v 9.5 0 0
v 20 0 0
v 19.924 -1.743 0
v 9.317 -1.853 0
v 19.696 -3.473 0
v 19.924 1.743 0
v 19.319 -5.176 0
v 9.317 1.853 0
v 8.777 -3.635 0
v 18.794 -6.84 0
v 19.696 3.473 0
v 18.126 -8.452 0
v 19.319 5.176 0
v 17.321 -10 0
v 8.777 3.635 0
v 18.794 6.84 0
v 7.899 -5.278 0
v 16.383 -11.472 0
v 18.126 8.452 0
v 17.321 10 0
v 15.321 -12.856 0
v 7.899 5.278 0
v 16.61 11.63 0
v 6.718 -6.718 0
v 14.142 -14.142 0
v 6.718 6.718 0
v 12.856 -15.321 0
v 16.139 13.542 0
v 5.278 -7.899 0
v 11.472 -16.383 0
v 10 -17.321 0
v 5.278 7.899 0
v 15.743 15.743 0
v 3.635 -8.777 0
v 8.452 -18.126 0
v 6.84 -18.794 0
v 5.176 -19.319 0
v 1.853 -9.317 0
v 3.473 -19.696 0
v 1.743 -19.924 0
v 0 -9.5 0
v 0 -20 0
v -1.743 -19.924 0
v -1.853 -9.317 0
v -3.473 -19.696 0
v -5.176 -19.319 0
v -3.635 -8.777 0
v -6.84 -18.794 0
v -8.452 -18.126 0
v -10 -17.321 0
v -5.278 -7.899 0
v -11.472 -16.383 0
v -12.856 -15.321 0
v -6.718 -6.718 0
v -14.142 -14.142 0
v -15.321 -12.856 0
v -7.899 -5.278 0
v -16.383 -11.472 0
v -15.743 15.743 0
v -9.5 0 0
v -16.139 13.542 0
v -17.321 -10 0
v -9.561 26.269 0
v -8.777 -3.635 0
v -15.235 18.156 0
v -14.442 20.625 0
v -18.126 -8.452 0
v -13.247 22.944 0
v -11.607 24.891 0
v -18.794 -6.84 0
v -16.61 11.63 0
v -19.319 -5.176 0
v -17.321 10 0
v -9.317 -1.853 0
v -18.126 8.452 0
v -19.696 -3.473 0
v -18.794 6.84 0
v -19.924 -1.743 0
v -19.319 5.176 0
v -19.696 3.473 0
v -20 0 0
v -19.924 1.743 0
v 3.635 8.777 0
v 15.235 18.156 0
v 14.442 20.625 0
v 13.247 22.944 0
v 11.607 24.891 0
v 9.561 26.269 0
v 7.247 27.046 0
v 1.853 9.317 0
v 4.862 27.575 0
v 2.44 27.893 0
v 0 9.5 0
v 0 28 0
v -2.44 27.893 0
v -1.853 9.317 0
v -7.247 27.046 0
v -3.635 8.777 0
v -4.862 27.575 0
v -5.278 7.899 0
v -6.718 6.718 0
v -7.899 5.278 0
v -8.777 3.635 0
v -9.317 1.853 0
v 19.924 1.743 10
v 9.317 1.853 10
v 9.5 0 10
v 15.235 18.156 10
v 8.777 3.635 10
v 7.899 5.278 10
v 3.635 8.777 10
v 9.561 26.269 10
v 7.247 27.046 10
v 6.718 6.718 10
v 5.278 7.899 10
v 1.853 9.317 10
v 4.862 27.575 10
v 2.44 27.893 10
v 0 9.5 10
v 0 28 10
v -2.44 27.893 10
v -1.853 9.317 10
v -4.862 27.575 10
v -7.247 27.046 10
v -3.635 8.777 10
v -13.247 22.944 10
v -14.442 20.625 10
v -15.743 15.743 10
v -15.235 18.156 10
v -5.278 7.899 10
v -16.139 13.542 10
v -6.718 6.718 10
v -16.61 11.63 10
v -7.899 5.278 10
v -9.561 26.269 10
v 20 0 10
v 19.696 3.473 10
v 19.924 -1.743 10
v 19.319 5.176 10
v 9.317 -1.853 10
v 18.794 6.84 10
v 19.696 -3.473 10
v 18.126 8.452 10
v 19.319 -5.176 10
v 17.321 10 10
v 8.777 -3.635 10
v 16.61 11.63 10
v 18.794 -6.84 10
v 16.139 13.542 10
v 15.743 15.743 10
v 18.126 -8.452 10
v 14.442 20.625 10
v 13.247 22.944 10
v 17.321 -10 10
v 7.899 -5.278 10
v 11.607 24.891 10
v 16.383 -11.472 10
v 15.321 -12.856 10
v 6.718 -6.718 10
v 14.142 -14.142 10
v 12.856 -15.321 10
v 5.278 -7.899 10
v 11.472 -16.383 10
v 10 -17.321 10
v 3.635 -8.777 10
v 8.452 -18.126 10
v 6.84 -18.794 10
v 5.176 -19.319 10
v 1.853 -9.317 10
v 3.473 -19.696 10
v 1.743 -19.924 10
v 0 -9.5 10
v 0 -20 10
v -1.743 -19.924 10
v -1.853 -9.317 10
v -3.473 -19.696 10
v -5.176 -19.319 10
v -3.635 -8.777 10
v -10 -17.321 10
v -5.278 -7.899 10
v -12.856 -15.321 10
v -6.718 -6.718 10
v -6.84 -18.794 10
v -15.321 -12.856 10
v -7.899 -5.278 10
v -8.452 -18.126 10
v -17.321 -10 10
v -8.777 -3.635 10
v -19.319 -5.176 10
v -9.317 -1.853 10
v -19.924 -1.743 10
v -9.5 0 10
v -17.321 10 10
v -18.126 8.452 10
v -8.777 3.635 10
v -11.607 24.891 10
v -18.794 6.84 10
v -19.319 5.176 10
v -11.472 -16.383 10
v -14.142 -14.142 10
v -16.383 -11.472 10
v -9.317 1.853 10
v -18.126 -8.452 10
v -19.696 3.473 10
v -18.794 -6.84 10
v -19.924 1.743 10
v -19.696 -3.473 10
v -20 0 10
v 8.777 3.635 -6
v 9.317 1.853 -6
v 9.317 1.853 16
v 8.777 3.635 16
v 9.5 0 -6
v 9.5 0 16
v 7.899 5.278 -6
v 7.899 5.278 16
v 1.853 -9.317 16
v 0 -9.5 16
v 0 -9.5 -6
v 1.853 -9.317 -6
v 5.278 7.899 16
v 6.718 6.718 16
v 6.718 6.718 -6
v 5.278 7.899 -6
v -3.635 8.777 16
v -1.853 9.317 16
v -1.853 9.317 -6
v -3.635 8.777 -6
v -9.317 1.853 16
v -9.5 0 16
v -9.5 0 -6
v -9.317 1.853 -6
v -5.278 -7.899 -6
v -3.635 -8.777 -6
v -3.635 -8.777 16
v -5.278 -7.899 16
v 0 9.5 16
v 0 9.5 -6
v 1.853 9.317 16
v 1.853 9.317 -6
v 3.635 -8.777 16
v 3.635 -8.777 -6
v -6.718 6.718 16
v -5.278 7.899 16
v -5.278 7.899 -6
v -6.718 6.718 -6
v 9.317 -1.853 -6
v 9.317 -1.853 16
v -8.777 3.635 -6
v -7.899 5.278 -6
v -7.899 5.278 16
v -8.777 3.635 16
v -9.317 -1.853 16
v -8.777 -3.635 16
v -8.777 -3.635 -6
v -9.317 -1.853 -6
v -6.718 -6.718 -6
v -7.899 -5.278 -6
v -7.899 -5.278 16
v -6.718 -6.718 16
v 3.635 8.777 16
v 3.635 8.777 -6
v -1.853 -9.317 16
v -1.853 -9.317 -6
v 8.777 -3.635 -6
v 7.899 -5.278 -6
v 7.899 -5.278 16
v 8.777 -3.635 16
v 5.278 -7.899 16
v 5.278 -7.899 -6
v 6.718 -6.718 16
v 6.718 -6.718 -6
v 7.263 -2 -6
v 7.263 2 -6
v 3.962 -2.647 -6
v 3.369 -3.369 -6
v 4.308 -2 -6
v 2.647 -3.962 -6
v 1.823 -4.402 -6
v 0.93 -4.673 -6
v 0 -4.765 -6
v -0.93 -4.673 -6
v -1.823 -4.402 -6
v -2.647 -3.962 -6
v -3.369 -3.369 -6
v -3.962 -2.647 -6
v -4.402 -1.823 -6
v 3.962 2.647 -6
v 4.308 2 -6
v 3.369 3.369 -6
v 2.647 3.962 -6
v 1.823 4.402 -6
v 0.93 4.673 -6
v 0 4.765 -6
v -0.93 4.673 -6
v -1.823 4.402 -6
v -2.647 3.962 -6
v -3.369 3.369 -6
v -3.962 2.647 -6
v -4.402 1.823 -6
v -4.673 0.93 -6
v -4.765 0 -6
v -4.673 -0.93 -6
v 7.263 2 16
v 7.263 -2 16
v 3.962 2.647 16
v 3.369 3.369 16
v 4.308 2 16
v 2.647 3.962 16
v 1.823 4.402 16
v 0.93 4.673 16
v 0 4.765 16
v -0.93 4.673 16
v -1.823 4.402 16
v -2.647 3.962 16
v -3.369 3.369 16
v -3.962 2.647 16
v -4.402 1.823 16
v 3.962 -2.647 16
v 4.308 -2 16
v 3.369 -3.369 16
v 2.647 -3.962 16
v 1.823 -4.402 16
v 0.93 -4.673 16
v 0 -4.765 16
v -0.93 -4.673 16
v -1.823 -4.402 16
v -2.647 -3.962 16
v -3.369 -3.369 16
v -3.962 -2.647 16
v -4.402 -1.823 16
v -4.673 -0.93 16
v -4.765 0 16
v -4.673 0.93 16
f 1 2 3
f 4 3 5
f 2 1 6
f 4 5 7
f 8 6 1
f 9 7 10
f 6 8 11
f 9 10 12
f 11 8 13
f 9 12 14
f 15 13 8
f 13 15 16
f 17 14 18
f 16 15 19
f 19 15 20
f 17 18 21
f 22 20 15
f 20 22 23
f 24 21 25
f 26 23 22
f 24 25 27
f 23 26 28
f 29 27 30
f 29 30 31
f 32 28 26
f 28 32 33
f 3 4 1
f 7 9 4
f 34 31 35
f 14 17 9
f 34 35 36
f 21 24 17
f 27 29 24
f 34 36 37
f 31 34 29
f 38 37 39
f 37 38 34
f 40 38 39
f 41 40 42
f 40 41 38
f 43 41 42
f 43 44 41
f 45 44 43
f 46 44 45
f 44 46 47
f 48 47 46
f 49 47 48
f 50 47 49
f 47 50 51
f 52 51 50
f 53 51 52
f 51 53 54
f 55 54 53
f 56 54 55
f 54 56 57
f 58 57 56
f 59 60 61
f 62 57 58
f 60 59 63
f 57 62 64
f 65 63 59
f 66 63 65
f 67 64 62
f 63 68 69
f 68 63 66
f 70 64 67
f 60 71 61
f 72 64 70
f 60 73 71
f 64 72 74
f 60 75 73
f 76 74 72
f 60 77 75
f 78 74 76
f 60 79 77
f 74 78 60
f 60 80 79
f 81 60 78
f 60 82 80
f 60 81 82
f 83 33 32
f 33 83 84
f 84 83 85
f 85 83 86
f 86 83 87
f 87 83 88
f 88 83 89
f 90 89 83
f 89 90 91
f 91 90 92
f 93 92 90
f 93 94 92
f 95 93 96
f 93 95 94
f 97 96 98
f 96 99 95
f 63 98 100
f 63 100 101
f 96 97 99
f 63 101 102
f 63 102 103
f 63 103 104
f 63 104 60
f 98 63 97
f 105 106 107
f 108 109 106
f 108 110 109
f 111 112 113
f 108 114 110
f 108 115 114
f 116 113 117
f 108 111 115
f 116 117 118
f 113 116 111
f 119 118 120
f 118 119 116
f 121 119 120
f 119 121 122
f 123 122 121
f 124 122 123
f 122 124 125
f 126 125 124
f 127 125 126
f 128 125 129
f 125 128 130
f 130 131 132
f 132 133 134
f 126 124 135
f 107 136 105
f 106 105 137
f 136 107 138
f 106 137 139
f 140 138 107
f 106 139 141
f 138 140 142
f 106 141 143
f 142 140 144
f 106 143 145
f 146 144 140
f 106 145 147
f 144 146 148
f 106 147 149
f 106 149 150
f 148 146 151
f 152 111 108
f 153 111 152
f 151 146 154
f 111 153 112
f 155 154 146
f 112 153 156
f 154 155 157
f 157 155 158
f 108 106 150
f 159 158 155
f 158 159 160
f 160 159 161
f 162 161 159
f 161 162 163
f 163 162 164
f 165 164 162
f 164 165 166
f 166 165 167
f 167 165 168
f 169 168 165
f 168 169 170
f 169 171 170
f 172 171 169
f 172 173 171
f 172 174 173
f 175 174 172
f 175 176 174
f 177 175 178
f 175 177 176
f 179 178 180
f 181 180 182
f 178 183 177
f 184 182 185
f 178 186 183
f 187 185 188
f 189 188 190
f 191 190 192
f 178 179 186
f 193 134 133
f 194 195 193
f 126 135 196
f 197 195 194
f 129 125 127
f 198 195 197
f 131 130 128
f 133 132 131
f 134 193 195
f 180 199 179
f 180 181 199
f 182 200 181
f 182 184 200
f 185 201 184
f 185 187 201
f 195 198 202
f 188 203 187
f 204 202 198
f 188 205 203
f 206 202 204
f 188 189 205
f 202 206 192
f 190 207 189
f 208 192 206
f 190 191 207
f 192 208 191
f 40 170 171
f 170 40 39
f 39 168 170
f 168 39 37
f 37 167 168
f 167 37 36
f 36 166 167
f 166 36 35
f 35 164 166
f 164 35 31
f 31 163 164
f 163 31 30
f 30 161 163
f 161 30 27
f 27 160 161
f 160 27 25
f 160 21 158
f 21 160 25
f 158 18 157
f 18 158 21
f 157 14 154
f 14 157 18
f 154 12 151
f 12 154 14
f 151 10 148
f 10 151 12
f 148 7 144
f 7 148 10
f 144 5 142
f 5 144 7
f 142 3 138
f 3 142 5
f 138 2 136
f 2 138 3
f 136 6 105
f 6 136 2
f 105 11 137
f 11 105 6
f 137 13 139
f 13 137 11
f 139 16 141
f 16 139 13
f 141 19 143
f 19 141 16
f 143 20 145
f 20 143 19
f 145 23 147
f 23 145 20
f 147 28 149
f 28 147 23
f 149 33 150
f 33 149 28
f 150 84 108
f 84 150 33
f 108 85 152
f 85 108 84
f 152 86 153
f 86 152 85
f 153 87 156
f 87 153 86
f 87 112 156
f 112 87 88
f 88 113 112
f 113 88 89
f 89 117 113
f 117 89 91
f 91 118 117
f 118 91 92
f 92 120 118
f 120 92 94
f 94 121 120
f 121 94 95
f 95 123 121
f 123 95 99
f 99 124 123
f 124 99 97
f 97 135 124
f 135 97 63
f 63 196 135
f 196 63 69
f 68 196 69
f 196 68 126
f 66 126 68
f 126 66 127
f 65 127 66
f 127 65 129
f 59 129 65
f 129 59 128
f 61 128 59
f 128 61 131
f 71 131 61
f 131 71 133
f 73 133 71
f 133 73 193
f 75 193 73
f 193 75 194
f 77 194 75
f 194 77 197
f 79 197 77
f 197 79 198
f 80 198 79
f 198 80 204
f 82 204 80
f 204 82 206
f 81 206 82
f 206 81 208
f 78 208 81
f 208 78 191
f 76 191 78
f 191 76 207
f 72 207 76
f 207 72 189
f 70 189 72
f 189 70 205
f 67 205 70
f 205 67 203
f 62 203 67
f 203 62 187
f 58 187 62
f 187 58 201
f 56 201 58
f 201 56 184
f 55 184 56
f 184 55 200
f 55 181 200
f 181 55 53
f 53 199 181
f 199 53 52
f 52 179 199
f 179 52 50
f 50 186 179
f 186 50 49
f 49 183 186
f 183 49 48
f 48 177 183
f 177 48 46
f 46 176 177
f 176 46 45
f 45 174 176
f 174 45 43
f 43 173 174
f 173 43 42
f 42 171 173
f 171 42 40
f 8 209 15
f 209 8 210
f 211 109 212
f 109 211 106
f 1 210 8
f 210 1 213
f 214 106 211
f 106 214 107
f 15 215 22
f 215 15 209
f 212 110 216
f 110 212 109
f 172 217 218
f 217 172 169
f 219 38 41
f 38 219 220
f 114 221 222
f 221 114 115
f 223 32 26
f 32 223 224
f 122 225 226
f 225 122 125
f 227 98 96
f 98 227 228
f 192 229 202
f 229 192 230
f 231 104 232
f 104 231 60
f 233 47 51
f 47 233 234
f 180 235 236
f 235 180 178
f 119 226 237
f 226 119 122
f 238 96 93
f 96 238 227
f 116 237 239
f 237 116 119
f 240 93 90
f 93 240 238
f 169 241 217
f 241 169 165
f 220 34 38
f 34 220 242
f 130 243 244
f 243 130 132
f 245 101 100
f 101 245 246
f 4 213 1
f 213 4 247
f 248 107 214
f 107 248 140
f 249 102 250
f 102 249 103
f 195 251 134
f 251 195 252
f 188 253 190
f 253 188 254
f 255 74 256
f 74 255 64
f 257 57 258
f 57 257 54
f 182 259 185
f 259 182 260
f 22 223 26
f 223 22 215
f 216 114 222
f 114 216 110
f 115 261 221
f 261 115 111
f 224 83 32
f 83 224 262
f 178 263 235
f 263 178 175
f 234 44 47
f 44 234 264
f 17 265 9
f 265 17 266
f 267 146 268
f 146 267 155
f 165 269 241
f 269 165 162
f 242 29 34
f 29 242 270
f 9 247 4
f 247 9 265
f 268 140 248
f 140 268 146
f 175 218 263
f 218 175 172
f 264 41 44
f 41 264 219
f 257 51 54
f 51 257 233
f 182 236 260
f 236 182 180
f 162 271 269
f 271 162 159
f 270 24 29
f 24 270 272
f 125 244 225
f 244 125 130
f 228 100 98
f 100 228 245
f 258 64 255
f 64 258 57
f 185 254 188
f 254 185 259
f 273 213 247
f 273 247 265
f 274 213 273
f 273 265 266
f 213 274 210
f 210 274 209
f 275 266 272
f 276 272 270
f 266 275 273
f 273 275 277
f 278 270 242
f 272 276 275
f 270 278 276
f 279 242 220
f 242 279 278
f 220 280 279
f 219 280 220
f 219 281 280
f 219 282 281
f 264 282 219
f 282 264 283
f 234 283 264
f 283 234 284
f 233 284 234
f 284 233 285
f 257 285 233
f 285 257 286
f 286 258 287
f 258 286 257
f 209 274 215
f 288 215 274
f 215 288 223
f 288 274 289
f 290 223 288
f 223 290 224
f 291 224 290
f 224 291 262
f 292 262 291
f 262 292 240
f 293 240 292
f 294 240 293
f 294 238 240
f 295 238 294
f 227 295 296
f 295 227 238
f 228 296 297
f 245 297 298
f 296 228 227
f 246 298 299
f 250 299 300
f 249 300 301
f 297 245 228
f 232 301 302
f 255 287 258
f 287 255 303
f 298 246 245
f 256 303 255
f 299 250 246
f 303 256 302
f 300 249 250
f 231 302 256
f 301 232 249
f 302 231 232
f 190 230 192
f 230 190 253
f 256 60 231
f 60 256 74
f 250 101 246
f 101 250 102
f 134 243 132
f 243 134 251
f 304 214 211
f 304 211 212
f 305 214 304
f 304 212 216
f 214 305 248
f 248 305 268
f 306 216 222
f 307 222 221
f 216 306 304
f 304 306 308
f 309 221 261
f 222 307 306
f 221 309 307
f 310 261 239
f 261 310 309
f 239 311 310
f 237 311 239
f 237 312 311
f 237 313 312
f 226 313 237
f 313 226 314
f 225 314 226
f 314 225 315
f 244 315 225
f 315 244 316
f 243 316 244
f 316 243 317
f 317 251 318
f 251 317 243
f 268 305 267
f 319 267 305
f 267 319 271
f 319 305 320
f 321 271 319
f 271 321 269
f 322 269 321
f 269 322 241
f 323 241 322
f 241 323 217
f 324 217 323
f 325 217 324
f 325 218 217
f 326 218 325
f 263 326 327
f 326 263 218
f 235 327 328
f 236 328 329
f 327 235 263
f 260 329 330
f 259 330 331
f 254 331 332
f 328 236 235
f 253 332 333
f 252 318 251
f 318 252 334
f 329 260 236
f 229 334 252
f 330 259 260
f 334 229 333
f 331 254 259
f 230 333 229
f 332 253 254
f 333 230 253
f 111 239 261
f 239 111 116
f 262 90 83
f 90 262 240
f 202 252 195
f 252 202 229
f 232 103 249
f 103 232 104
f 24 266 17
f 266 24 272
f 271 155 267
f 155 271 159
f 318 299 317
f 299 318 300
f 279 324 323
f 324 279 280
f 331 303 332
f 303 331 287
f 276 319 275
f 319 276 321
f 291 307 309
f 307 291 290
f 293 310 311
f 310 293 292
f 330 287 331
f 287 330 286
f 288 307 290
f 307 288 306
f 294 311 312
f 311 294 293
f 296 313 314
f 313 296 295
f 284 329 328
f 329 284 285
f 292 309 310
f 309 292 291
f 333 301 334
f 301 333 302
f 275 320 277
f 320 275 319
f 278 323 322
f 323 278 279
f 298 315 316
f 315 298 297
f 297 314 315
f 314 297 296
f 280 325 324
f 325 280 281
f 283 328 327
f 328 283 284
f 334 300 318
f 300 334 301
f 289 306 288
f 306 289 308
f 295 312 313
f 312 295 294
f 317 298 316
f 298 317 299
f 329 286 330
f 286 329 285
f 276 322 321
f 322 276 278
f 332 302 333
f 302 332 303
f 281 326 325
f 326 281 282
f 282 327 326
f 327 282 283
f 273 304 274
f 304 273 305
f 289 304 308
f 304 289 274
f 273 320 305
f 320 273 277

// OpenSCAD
$fn = 32;

// ----------------------------------------------------------------------
// Cam: base radius 20 mm with a 8 mm lift over 120 degrees
// ----------------------------------------------------------------------

// --- parameters (mm) ---
base_r = 20;              // base radius
lift = 8;                 // lift height above the base radius
lift_span = 120;          // angular width of the lift
lift_start = 30;          // angle where the lift starts
cam_t = 10;               // cam plate thickness
hub_d = 19;               // hub diameter
hub_h = 22;               // hub height
bore_d = 9.53;            // bore
key_w = 4;                // keyway width
key_depth = 2;            // keyway depth

cam_profile = [[20, 0], [19.924, 1.743], [19.696, 3.473], [19.319, 5.176], [18.794, 6.84], [18.126, 8.452], [17.321, 10], [16.61, 11.63], [16.139, 13.542], [15.743, 15.743], [15.235, 18.156], [14.442, 20.625], [13.247, 22.944], [11.607, 24.891], [9.561, 26.269], [7.247, 27.046], [4.862, 27.575], [2.44, 27.893], [0, 28], [-2.44, 27.893], [-4.862, 27.575], [-7.247, 27.046], [-9.561, 26.269], [-11.607, 24.891], [-13.247, 22.944], [-14.442, 20.625], [-15.235, 18.156], [-15.743, 15.743], [-16.139, 13.542], [-16.61, 11.63], [-17.321, 10], [-18.126, 8.452], [-18.794, 6.84], [-19.319, 5.176], [-19.696, 3.473], [-19.924, 1.743], [-20, 0], [-19.924, -1.743], [-19.696, -3.473], [-19.319, -5.176], [-18.794, -6.84], [-18.126, -8.452], [-17.321, -10], [-16.383, -11.472], [-15.321, -12.856], [-14.142, -14.142], [-12.856, -15.321], [-11.472, -16.383], [-10, -17.321], [-8.452, -18.126], [-6.84, -18.794], [-5.176, -19.319], [-3.473, -19.696], [-1.743, -19.924], [0, -20], [1.743, -19.924], [3.473, -19.696], [5.176, -19.319], [6.84, -18.794], [8.452, -18.126], [10, -17.321], [11.472, -16.383], [12.856, -15.321], [14.142, -14.142], [15.321, -12.856], [16.383, -11.472], [17.321, -10], [18.126, -8.452], [18.794, -6.84], [19.319, -5.176], [19.696, -3.473], [19.924, -1.743]];

difference() {
  union() {
    linear_extrude(height = cam_t) polygon(cam_profile);
    /* hub, proud of the cam plate on both sides */
    translate([0, 0, -6]) cylinder(h = hub_h, d = hub_d);
  }
  /* bore through the hub, 2.5 mm clear on both faces */
  translate([0, 0, -8.5]) cylinder(h = hub_h + 5, d = bore_d);
  /* keyway, milled through the whole hub */
  translate([2.763, -2, -8.5]) cube([4.5, 4, 27]);
}
